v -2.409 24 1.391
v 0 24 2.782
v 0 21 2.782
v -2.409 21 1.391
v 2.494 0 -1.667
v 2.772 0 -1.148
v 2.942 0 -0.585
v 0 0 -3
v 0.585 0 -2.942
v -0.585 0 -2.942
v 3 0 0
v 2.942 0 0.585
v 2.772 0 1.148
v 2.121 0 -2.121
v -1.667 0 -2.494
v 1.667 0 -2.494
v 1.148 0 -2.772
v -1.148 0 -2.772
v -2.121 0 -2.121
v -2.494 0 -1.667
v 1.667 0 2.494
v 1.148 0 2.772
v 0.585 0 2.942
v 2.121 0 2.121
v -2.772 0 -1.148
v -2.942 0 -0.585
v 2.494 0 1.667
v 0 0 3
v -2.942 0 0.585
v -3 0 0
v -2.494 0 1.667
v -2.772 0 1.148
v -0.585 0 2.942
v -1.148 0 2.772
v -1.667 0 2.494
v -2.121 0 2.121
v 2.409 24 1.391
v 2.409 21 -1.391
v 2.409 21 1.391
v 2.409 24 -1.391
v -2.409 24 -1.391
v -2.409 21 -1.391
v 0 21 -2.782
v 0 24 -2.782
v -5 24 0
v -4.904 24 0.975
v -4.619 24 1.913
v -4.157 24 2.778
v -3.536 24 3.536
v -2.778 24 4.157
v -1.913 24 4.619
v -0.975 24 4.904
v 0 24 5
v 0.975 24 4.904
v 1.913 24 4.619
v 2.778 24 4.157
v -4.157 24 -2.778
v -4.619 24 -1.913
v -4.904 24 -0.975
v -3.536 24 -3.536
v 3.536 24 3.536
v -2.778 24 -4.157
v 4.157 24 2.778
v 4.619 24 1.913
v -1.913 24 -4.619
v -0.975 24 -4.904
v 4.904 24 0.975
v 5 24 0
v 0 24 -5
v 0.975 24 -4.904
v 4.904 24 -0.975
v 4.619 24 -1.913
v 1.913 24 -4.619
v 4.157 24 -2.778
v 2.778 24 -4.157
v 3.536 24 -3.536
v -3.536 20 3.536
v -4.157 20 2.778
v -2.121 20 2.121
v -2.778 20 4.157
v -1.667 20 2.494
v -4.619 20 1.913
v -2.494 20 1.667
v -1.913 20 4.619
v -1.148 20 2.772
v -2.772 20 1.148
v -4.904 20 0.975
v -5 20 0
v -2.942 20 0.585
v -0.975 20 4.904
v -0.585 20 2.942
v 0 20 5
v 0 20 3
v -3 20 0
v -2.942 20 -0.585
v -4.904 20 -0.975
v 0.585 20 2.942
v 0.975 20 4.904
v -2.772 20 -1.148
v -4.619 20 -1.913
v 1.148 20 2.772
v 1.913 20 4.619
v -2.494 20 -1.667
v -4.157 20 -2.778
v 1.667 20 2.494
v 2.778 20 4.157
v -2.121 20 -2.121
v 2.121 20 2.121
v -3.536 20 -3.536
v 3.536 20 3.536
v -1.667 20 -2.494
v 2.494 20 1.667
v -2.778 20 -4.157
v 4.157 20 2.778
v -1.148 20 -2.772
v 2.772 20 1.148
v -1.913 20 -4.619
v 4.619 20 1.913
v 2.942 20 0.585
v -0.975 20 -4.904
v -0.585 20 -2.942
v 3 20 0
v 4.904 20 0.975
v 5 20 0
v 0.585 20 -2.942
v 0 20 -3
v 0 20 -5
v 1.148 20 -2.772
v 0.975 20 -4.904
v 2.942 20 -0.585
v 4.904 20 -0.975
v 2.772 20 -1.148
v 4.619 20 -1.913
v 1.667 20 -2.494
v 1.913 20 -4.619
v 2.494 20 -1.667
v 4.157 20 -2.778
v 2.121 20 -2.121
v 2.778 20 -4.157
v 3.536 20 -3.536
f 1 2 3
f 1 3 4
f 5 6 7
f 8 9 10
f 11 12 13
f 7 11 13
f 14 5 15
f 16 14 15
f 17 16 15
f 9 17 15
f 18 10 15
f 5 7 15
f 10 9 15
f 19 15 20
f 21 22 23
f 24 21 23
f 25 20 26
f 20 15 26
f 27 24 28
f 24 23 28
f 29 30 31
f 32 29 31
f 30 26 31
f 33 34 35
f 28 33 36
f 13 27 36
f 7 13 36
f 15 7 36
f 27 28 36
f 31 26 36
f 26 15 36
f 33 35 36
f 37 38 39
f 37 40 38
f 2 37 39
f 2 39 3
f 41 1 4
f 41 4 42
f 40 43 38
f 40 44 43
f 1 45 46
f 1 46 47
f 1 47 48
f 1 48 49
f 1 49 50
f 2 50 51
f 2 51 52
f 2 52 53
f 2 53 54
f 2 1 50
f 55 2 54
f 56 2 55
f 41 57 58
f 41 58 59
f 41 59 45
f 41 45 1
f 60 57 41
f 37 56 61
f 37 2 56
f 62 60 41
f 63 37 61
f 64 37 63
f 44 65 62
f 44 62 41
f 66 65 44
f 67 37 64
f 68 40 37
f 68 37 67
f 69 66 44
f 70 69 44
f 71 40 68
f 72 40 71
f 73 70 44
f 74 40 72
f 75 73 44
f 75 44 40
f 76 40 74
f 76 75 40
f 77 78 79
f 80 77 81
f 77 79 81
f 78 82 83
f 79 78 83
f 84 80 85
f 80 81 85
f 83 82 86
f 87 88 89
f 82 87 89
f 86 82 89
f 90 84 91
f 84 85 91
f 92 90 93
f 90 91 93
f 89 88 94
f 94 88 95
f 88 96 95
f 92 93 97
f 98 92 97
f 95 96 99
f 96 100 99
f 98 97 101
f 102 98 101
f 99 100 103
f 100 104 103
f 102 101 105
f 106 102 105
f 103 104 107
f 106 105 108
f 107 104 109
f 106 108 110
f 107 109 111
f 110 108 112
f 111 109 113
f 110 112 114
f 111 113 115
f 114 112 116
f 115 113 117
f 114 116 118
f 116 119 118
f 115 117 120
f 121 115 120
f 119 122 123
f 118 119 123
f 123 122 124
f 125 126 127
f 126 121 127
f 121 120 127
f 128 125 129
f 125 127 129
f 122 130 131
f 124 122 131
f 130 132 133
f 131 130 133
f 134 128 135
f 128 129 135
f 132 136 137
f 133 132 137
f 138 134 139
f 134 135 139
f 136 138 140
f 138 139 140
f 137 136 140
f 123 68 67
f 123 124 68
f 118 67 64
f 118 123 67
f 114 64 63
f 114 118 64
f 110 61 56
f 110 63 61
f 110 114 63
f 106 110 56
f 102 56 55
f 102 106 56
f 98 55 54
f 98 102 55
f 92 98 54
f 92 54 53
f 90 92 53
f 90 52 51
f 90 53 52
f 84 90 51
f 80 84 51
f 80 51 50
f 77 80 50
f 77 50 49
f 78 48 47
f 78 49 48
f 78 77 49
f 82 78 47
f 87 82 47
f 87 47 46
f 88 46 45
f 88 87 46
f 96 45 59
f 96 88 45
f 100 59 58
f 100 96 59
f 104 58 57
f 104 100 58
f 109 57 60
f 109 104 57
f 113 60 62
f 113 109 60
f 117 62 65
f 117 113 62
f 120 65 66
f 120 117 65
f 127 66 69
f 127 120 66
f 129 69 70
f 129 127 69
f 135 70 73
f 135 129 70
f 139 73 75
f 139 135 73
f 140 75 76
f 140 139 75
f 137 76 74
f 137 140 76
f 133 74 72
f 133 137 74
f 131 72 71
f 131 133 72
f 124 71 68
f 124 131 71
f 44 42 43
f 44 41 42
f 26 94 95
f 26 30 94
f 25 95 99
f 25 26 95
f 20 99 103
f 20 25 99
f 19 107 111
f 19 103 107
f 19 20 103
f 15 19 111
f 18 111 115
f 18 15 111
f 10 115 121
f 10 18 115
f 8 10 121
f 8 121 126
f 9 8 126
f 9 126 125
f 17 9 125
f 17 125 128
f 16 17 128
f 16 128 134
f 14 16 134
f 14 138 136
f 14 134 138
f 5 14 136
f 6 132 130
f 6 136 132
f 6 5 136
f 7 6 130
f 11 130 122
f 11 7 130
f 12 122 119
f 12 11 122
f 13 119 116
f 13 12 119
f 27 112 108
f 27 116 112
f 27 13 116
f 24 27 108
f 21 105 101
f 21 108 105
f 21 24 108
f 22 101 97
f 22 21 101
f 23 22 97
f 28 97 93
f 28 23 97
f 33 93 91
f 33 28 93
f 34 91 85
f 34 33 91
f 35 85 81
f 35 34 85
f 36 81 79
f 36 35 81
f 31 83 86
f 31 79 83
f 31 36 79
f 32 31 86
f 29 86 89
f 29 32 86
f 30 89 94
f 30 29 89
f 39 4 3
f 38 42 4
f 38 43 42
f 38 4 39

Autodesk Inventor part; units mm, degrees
ref_plane "YZ Plane" through (0, 0, 0) normal (1, 0, 0) x (0, 1, 0)
ref_plane "XZ Plane" through (0, 0, 0) normal (0, 1, 0) x (-1, 0, 0)
ref_plane "XY Plane" through (0, 0, 0) normal (0, 0, 1) x (1, 0, 0)
sketch "草圖1" plane through (0, 0, 0) normal (0, 1, 0) x (-1, 0, 0)
  circle A0 centre (0, 0) radius 3
  dimension "d0" = 6
extrude "擠出1" add sketch "草圖1" along normal blind 20
thread "螺紋1" size "M6x1" class "6g" standard "ANSI Metric M Profile" full length
sketch "草圖2" plane through (0, 20, 0) normal (0, 1, 0) x (1, 0, 0)
  circle A0 centre (0, 0) radius 5
  dimension "d5" = 10
extrude "擠出2" add sketch "草圖2" along normal blind 4
sketch "草圖3" plane through (0, 24, 0) normal (0, 1, 0) x (1, 0, 0)
  line L0 (0, 2.7818) -> (2.4091, 1.3909)
  line L1 (2.4091, 1.3909) -> (2.4091, -1.3909)
  line L2 (2.4091, -1.3909) -> (0, -2.7818)
  line L3 (0, -2.7818) -> (-2.4091, -1.3909)
  line L4 (-2.4091, -1.3909) -> (-2.4091, 1.3909)
  line L5 (-2.4091, 1.3909) -> (0, 2.7818)
  point P0 (0, 0)
  point P1 (0, 0)
extrude "擠出3" cut sketch "草圖3" against normal blind 3
properties part number "M6screw"
